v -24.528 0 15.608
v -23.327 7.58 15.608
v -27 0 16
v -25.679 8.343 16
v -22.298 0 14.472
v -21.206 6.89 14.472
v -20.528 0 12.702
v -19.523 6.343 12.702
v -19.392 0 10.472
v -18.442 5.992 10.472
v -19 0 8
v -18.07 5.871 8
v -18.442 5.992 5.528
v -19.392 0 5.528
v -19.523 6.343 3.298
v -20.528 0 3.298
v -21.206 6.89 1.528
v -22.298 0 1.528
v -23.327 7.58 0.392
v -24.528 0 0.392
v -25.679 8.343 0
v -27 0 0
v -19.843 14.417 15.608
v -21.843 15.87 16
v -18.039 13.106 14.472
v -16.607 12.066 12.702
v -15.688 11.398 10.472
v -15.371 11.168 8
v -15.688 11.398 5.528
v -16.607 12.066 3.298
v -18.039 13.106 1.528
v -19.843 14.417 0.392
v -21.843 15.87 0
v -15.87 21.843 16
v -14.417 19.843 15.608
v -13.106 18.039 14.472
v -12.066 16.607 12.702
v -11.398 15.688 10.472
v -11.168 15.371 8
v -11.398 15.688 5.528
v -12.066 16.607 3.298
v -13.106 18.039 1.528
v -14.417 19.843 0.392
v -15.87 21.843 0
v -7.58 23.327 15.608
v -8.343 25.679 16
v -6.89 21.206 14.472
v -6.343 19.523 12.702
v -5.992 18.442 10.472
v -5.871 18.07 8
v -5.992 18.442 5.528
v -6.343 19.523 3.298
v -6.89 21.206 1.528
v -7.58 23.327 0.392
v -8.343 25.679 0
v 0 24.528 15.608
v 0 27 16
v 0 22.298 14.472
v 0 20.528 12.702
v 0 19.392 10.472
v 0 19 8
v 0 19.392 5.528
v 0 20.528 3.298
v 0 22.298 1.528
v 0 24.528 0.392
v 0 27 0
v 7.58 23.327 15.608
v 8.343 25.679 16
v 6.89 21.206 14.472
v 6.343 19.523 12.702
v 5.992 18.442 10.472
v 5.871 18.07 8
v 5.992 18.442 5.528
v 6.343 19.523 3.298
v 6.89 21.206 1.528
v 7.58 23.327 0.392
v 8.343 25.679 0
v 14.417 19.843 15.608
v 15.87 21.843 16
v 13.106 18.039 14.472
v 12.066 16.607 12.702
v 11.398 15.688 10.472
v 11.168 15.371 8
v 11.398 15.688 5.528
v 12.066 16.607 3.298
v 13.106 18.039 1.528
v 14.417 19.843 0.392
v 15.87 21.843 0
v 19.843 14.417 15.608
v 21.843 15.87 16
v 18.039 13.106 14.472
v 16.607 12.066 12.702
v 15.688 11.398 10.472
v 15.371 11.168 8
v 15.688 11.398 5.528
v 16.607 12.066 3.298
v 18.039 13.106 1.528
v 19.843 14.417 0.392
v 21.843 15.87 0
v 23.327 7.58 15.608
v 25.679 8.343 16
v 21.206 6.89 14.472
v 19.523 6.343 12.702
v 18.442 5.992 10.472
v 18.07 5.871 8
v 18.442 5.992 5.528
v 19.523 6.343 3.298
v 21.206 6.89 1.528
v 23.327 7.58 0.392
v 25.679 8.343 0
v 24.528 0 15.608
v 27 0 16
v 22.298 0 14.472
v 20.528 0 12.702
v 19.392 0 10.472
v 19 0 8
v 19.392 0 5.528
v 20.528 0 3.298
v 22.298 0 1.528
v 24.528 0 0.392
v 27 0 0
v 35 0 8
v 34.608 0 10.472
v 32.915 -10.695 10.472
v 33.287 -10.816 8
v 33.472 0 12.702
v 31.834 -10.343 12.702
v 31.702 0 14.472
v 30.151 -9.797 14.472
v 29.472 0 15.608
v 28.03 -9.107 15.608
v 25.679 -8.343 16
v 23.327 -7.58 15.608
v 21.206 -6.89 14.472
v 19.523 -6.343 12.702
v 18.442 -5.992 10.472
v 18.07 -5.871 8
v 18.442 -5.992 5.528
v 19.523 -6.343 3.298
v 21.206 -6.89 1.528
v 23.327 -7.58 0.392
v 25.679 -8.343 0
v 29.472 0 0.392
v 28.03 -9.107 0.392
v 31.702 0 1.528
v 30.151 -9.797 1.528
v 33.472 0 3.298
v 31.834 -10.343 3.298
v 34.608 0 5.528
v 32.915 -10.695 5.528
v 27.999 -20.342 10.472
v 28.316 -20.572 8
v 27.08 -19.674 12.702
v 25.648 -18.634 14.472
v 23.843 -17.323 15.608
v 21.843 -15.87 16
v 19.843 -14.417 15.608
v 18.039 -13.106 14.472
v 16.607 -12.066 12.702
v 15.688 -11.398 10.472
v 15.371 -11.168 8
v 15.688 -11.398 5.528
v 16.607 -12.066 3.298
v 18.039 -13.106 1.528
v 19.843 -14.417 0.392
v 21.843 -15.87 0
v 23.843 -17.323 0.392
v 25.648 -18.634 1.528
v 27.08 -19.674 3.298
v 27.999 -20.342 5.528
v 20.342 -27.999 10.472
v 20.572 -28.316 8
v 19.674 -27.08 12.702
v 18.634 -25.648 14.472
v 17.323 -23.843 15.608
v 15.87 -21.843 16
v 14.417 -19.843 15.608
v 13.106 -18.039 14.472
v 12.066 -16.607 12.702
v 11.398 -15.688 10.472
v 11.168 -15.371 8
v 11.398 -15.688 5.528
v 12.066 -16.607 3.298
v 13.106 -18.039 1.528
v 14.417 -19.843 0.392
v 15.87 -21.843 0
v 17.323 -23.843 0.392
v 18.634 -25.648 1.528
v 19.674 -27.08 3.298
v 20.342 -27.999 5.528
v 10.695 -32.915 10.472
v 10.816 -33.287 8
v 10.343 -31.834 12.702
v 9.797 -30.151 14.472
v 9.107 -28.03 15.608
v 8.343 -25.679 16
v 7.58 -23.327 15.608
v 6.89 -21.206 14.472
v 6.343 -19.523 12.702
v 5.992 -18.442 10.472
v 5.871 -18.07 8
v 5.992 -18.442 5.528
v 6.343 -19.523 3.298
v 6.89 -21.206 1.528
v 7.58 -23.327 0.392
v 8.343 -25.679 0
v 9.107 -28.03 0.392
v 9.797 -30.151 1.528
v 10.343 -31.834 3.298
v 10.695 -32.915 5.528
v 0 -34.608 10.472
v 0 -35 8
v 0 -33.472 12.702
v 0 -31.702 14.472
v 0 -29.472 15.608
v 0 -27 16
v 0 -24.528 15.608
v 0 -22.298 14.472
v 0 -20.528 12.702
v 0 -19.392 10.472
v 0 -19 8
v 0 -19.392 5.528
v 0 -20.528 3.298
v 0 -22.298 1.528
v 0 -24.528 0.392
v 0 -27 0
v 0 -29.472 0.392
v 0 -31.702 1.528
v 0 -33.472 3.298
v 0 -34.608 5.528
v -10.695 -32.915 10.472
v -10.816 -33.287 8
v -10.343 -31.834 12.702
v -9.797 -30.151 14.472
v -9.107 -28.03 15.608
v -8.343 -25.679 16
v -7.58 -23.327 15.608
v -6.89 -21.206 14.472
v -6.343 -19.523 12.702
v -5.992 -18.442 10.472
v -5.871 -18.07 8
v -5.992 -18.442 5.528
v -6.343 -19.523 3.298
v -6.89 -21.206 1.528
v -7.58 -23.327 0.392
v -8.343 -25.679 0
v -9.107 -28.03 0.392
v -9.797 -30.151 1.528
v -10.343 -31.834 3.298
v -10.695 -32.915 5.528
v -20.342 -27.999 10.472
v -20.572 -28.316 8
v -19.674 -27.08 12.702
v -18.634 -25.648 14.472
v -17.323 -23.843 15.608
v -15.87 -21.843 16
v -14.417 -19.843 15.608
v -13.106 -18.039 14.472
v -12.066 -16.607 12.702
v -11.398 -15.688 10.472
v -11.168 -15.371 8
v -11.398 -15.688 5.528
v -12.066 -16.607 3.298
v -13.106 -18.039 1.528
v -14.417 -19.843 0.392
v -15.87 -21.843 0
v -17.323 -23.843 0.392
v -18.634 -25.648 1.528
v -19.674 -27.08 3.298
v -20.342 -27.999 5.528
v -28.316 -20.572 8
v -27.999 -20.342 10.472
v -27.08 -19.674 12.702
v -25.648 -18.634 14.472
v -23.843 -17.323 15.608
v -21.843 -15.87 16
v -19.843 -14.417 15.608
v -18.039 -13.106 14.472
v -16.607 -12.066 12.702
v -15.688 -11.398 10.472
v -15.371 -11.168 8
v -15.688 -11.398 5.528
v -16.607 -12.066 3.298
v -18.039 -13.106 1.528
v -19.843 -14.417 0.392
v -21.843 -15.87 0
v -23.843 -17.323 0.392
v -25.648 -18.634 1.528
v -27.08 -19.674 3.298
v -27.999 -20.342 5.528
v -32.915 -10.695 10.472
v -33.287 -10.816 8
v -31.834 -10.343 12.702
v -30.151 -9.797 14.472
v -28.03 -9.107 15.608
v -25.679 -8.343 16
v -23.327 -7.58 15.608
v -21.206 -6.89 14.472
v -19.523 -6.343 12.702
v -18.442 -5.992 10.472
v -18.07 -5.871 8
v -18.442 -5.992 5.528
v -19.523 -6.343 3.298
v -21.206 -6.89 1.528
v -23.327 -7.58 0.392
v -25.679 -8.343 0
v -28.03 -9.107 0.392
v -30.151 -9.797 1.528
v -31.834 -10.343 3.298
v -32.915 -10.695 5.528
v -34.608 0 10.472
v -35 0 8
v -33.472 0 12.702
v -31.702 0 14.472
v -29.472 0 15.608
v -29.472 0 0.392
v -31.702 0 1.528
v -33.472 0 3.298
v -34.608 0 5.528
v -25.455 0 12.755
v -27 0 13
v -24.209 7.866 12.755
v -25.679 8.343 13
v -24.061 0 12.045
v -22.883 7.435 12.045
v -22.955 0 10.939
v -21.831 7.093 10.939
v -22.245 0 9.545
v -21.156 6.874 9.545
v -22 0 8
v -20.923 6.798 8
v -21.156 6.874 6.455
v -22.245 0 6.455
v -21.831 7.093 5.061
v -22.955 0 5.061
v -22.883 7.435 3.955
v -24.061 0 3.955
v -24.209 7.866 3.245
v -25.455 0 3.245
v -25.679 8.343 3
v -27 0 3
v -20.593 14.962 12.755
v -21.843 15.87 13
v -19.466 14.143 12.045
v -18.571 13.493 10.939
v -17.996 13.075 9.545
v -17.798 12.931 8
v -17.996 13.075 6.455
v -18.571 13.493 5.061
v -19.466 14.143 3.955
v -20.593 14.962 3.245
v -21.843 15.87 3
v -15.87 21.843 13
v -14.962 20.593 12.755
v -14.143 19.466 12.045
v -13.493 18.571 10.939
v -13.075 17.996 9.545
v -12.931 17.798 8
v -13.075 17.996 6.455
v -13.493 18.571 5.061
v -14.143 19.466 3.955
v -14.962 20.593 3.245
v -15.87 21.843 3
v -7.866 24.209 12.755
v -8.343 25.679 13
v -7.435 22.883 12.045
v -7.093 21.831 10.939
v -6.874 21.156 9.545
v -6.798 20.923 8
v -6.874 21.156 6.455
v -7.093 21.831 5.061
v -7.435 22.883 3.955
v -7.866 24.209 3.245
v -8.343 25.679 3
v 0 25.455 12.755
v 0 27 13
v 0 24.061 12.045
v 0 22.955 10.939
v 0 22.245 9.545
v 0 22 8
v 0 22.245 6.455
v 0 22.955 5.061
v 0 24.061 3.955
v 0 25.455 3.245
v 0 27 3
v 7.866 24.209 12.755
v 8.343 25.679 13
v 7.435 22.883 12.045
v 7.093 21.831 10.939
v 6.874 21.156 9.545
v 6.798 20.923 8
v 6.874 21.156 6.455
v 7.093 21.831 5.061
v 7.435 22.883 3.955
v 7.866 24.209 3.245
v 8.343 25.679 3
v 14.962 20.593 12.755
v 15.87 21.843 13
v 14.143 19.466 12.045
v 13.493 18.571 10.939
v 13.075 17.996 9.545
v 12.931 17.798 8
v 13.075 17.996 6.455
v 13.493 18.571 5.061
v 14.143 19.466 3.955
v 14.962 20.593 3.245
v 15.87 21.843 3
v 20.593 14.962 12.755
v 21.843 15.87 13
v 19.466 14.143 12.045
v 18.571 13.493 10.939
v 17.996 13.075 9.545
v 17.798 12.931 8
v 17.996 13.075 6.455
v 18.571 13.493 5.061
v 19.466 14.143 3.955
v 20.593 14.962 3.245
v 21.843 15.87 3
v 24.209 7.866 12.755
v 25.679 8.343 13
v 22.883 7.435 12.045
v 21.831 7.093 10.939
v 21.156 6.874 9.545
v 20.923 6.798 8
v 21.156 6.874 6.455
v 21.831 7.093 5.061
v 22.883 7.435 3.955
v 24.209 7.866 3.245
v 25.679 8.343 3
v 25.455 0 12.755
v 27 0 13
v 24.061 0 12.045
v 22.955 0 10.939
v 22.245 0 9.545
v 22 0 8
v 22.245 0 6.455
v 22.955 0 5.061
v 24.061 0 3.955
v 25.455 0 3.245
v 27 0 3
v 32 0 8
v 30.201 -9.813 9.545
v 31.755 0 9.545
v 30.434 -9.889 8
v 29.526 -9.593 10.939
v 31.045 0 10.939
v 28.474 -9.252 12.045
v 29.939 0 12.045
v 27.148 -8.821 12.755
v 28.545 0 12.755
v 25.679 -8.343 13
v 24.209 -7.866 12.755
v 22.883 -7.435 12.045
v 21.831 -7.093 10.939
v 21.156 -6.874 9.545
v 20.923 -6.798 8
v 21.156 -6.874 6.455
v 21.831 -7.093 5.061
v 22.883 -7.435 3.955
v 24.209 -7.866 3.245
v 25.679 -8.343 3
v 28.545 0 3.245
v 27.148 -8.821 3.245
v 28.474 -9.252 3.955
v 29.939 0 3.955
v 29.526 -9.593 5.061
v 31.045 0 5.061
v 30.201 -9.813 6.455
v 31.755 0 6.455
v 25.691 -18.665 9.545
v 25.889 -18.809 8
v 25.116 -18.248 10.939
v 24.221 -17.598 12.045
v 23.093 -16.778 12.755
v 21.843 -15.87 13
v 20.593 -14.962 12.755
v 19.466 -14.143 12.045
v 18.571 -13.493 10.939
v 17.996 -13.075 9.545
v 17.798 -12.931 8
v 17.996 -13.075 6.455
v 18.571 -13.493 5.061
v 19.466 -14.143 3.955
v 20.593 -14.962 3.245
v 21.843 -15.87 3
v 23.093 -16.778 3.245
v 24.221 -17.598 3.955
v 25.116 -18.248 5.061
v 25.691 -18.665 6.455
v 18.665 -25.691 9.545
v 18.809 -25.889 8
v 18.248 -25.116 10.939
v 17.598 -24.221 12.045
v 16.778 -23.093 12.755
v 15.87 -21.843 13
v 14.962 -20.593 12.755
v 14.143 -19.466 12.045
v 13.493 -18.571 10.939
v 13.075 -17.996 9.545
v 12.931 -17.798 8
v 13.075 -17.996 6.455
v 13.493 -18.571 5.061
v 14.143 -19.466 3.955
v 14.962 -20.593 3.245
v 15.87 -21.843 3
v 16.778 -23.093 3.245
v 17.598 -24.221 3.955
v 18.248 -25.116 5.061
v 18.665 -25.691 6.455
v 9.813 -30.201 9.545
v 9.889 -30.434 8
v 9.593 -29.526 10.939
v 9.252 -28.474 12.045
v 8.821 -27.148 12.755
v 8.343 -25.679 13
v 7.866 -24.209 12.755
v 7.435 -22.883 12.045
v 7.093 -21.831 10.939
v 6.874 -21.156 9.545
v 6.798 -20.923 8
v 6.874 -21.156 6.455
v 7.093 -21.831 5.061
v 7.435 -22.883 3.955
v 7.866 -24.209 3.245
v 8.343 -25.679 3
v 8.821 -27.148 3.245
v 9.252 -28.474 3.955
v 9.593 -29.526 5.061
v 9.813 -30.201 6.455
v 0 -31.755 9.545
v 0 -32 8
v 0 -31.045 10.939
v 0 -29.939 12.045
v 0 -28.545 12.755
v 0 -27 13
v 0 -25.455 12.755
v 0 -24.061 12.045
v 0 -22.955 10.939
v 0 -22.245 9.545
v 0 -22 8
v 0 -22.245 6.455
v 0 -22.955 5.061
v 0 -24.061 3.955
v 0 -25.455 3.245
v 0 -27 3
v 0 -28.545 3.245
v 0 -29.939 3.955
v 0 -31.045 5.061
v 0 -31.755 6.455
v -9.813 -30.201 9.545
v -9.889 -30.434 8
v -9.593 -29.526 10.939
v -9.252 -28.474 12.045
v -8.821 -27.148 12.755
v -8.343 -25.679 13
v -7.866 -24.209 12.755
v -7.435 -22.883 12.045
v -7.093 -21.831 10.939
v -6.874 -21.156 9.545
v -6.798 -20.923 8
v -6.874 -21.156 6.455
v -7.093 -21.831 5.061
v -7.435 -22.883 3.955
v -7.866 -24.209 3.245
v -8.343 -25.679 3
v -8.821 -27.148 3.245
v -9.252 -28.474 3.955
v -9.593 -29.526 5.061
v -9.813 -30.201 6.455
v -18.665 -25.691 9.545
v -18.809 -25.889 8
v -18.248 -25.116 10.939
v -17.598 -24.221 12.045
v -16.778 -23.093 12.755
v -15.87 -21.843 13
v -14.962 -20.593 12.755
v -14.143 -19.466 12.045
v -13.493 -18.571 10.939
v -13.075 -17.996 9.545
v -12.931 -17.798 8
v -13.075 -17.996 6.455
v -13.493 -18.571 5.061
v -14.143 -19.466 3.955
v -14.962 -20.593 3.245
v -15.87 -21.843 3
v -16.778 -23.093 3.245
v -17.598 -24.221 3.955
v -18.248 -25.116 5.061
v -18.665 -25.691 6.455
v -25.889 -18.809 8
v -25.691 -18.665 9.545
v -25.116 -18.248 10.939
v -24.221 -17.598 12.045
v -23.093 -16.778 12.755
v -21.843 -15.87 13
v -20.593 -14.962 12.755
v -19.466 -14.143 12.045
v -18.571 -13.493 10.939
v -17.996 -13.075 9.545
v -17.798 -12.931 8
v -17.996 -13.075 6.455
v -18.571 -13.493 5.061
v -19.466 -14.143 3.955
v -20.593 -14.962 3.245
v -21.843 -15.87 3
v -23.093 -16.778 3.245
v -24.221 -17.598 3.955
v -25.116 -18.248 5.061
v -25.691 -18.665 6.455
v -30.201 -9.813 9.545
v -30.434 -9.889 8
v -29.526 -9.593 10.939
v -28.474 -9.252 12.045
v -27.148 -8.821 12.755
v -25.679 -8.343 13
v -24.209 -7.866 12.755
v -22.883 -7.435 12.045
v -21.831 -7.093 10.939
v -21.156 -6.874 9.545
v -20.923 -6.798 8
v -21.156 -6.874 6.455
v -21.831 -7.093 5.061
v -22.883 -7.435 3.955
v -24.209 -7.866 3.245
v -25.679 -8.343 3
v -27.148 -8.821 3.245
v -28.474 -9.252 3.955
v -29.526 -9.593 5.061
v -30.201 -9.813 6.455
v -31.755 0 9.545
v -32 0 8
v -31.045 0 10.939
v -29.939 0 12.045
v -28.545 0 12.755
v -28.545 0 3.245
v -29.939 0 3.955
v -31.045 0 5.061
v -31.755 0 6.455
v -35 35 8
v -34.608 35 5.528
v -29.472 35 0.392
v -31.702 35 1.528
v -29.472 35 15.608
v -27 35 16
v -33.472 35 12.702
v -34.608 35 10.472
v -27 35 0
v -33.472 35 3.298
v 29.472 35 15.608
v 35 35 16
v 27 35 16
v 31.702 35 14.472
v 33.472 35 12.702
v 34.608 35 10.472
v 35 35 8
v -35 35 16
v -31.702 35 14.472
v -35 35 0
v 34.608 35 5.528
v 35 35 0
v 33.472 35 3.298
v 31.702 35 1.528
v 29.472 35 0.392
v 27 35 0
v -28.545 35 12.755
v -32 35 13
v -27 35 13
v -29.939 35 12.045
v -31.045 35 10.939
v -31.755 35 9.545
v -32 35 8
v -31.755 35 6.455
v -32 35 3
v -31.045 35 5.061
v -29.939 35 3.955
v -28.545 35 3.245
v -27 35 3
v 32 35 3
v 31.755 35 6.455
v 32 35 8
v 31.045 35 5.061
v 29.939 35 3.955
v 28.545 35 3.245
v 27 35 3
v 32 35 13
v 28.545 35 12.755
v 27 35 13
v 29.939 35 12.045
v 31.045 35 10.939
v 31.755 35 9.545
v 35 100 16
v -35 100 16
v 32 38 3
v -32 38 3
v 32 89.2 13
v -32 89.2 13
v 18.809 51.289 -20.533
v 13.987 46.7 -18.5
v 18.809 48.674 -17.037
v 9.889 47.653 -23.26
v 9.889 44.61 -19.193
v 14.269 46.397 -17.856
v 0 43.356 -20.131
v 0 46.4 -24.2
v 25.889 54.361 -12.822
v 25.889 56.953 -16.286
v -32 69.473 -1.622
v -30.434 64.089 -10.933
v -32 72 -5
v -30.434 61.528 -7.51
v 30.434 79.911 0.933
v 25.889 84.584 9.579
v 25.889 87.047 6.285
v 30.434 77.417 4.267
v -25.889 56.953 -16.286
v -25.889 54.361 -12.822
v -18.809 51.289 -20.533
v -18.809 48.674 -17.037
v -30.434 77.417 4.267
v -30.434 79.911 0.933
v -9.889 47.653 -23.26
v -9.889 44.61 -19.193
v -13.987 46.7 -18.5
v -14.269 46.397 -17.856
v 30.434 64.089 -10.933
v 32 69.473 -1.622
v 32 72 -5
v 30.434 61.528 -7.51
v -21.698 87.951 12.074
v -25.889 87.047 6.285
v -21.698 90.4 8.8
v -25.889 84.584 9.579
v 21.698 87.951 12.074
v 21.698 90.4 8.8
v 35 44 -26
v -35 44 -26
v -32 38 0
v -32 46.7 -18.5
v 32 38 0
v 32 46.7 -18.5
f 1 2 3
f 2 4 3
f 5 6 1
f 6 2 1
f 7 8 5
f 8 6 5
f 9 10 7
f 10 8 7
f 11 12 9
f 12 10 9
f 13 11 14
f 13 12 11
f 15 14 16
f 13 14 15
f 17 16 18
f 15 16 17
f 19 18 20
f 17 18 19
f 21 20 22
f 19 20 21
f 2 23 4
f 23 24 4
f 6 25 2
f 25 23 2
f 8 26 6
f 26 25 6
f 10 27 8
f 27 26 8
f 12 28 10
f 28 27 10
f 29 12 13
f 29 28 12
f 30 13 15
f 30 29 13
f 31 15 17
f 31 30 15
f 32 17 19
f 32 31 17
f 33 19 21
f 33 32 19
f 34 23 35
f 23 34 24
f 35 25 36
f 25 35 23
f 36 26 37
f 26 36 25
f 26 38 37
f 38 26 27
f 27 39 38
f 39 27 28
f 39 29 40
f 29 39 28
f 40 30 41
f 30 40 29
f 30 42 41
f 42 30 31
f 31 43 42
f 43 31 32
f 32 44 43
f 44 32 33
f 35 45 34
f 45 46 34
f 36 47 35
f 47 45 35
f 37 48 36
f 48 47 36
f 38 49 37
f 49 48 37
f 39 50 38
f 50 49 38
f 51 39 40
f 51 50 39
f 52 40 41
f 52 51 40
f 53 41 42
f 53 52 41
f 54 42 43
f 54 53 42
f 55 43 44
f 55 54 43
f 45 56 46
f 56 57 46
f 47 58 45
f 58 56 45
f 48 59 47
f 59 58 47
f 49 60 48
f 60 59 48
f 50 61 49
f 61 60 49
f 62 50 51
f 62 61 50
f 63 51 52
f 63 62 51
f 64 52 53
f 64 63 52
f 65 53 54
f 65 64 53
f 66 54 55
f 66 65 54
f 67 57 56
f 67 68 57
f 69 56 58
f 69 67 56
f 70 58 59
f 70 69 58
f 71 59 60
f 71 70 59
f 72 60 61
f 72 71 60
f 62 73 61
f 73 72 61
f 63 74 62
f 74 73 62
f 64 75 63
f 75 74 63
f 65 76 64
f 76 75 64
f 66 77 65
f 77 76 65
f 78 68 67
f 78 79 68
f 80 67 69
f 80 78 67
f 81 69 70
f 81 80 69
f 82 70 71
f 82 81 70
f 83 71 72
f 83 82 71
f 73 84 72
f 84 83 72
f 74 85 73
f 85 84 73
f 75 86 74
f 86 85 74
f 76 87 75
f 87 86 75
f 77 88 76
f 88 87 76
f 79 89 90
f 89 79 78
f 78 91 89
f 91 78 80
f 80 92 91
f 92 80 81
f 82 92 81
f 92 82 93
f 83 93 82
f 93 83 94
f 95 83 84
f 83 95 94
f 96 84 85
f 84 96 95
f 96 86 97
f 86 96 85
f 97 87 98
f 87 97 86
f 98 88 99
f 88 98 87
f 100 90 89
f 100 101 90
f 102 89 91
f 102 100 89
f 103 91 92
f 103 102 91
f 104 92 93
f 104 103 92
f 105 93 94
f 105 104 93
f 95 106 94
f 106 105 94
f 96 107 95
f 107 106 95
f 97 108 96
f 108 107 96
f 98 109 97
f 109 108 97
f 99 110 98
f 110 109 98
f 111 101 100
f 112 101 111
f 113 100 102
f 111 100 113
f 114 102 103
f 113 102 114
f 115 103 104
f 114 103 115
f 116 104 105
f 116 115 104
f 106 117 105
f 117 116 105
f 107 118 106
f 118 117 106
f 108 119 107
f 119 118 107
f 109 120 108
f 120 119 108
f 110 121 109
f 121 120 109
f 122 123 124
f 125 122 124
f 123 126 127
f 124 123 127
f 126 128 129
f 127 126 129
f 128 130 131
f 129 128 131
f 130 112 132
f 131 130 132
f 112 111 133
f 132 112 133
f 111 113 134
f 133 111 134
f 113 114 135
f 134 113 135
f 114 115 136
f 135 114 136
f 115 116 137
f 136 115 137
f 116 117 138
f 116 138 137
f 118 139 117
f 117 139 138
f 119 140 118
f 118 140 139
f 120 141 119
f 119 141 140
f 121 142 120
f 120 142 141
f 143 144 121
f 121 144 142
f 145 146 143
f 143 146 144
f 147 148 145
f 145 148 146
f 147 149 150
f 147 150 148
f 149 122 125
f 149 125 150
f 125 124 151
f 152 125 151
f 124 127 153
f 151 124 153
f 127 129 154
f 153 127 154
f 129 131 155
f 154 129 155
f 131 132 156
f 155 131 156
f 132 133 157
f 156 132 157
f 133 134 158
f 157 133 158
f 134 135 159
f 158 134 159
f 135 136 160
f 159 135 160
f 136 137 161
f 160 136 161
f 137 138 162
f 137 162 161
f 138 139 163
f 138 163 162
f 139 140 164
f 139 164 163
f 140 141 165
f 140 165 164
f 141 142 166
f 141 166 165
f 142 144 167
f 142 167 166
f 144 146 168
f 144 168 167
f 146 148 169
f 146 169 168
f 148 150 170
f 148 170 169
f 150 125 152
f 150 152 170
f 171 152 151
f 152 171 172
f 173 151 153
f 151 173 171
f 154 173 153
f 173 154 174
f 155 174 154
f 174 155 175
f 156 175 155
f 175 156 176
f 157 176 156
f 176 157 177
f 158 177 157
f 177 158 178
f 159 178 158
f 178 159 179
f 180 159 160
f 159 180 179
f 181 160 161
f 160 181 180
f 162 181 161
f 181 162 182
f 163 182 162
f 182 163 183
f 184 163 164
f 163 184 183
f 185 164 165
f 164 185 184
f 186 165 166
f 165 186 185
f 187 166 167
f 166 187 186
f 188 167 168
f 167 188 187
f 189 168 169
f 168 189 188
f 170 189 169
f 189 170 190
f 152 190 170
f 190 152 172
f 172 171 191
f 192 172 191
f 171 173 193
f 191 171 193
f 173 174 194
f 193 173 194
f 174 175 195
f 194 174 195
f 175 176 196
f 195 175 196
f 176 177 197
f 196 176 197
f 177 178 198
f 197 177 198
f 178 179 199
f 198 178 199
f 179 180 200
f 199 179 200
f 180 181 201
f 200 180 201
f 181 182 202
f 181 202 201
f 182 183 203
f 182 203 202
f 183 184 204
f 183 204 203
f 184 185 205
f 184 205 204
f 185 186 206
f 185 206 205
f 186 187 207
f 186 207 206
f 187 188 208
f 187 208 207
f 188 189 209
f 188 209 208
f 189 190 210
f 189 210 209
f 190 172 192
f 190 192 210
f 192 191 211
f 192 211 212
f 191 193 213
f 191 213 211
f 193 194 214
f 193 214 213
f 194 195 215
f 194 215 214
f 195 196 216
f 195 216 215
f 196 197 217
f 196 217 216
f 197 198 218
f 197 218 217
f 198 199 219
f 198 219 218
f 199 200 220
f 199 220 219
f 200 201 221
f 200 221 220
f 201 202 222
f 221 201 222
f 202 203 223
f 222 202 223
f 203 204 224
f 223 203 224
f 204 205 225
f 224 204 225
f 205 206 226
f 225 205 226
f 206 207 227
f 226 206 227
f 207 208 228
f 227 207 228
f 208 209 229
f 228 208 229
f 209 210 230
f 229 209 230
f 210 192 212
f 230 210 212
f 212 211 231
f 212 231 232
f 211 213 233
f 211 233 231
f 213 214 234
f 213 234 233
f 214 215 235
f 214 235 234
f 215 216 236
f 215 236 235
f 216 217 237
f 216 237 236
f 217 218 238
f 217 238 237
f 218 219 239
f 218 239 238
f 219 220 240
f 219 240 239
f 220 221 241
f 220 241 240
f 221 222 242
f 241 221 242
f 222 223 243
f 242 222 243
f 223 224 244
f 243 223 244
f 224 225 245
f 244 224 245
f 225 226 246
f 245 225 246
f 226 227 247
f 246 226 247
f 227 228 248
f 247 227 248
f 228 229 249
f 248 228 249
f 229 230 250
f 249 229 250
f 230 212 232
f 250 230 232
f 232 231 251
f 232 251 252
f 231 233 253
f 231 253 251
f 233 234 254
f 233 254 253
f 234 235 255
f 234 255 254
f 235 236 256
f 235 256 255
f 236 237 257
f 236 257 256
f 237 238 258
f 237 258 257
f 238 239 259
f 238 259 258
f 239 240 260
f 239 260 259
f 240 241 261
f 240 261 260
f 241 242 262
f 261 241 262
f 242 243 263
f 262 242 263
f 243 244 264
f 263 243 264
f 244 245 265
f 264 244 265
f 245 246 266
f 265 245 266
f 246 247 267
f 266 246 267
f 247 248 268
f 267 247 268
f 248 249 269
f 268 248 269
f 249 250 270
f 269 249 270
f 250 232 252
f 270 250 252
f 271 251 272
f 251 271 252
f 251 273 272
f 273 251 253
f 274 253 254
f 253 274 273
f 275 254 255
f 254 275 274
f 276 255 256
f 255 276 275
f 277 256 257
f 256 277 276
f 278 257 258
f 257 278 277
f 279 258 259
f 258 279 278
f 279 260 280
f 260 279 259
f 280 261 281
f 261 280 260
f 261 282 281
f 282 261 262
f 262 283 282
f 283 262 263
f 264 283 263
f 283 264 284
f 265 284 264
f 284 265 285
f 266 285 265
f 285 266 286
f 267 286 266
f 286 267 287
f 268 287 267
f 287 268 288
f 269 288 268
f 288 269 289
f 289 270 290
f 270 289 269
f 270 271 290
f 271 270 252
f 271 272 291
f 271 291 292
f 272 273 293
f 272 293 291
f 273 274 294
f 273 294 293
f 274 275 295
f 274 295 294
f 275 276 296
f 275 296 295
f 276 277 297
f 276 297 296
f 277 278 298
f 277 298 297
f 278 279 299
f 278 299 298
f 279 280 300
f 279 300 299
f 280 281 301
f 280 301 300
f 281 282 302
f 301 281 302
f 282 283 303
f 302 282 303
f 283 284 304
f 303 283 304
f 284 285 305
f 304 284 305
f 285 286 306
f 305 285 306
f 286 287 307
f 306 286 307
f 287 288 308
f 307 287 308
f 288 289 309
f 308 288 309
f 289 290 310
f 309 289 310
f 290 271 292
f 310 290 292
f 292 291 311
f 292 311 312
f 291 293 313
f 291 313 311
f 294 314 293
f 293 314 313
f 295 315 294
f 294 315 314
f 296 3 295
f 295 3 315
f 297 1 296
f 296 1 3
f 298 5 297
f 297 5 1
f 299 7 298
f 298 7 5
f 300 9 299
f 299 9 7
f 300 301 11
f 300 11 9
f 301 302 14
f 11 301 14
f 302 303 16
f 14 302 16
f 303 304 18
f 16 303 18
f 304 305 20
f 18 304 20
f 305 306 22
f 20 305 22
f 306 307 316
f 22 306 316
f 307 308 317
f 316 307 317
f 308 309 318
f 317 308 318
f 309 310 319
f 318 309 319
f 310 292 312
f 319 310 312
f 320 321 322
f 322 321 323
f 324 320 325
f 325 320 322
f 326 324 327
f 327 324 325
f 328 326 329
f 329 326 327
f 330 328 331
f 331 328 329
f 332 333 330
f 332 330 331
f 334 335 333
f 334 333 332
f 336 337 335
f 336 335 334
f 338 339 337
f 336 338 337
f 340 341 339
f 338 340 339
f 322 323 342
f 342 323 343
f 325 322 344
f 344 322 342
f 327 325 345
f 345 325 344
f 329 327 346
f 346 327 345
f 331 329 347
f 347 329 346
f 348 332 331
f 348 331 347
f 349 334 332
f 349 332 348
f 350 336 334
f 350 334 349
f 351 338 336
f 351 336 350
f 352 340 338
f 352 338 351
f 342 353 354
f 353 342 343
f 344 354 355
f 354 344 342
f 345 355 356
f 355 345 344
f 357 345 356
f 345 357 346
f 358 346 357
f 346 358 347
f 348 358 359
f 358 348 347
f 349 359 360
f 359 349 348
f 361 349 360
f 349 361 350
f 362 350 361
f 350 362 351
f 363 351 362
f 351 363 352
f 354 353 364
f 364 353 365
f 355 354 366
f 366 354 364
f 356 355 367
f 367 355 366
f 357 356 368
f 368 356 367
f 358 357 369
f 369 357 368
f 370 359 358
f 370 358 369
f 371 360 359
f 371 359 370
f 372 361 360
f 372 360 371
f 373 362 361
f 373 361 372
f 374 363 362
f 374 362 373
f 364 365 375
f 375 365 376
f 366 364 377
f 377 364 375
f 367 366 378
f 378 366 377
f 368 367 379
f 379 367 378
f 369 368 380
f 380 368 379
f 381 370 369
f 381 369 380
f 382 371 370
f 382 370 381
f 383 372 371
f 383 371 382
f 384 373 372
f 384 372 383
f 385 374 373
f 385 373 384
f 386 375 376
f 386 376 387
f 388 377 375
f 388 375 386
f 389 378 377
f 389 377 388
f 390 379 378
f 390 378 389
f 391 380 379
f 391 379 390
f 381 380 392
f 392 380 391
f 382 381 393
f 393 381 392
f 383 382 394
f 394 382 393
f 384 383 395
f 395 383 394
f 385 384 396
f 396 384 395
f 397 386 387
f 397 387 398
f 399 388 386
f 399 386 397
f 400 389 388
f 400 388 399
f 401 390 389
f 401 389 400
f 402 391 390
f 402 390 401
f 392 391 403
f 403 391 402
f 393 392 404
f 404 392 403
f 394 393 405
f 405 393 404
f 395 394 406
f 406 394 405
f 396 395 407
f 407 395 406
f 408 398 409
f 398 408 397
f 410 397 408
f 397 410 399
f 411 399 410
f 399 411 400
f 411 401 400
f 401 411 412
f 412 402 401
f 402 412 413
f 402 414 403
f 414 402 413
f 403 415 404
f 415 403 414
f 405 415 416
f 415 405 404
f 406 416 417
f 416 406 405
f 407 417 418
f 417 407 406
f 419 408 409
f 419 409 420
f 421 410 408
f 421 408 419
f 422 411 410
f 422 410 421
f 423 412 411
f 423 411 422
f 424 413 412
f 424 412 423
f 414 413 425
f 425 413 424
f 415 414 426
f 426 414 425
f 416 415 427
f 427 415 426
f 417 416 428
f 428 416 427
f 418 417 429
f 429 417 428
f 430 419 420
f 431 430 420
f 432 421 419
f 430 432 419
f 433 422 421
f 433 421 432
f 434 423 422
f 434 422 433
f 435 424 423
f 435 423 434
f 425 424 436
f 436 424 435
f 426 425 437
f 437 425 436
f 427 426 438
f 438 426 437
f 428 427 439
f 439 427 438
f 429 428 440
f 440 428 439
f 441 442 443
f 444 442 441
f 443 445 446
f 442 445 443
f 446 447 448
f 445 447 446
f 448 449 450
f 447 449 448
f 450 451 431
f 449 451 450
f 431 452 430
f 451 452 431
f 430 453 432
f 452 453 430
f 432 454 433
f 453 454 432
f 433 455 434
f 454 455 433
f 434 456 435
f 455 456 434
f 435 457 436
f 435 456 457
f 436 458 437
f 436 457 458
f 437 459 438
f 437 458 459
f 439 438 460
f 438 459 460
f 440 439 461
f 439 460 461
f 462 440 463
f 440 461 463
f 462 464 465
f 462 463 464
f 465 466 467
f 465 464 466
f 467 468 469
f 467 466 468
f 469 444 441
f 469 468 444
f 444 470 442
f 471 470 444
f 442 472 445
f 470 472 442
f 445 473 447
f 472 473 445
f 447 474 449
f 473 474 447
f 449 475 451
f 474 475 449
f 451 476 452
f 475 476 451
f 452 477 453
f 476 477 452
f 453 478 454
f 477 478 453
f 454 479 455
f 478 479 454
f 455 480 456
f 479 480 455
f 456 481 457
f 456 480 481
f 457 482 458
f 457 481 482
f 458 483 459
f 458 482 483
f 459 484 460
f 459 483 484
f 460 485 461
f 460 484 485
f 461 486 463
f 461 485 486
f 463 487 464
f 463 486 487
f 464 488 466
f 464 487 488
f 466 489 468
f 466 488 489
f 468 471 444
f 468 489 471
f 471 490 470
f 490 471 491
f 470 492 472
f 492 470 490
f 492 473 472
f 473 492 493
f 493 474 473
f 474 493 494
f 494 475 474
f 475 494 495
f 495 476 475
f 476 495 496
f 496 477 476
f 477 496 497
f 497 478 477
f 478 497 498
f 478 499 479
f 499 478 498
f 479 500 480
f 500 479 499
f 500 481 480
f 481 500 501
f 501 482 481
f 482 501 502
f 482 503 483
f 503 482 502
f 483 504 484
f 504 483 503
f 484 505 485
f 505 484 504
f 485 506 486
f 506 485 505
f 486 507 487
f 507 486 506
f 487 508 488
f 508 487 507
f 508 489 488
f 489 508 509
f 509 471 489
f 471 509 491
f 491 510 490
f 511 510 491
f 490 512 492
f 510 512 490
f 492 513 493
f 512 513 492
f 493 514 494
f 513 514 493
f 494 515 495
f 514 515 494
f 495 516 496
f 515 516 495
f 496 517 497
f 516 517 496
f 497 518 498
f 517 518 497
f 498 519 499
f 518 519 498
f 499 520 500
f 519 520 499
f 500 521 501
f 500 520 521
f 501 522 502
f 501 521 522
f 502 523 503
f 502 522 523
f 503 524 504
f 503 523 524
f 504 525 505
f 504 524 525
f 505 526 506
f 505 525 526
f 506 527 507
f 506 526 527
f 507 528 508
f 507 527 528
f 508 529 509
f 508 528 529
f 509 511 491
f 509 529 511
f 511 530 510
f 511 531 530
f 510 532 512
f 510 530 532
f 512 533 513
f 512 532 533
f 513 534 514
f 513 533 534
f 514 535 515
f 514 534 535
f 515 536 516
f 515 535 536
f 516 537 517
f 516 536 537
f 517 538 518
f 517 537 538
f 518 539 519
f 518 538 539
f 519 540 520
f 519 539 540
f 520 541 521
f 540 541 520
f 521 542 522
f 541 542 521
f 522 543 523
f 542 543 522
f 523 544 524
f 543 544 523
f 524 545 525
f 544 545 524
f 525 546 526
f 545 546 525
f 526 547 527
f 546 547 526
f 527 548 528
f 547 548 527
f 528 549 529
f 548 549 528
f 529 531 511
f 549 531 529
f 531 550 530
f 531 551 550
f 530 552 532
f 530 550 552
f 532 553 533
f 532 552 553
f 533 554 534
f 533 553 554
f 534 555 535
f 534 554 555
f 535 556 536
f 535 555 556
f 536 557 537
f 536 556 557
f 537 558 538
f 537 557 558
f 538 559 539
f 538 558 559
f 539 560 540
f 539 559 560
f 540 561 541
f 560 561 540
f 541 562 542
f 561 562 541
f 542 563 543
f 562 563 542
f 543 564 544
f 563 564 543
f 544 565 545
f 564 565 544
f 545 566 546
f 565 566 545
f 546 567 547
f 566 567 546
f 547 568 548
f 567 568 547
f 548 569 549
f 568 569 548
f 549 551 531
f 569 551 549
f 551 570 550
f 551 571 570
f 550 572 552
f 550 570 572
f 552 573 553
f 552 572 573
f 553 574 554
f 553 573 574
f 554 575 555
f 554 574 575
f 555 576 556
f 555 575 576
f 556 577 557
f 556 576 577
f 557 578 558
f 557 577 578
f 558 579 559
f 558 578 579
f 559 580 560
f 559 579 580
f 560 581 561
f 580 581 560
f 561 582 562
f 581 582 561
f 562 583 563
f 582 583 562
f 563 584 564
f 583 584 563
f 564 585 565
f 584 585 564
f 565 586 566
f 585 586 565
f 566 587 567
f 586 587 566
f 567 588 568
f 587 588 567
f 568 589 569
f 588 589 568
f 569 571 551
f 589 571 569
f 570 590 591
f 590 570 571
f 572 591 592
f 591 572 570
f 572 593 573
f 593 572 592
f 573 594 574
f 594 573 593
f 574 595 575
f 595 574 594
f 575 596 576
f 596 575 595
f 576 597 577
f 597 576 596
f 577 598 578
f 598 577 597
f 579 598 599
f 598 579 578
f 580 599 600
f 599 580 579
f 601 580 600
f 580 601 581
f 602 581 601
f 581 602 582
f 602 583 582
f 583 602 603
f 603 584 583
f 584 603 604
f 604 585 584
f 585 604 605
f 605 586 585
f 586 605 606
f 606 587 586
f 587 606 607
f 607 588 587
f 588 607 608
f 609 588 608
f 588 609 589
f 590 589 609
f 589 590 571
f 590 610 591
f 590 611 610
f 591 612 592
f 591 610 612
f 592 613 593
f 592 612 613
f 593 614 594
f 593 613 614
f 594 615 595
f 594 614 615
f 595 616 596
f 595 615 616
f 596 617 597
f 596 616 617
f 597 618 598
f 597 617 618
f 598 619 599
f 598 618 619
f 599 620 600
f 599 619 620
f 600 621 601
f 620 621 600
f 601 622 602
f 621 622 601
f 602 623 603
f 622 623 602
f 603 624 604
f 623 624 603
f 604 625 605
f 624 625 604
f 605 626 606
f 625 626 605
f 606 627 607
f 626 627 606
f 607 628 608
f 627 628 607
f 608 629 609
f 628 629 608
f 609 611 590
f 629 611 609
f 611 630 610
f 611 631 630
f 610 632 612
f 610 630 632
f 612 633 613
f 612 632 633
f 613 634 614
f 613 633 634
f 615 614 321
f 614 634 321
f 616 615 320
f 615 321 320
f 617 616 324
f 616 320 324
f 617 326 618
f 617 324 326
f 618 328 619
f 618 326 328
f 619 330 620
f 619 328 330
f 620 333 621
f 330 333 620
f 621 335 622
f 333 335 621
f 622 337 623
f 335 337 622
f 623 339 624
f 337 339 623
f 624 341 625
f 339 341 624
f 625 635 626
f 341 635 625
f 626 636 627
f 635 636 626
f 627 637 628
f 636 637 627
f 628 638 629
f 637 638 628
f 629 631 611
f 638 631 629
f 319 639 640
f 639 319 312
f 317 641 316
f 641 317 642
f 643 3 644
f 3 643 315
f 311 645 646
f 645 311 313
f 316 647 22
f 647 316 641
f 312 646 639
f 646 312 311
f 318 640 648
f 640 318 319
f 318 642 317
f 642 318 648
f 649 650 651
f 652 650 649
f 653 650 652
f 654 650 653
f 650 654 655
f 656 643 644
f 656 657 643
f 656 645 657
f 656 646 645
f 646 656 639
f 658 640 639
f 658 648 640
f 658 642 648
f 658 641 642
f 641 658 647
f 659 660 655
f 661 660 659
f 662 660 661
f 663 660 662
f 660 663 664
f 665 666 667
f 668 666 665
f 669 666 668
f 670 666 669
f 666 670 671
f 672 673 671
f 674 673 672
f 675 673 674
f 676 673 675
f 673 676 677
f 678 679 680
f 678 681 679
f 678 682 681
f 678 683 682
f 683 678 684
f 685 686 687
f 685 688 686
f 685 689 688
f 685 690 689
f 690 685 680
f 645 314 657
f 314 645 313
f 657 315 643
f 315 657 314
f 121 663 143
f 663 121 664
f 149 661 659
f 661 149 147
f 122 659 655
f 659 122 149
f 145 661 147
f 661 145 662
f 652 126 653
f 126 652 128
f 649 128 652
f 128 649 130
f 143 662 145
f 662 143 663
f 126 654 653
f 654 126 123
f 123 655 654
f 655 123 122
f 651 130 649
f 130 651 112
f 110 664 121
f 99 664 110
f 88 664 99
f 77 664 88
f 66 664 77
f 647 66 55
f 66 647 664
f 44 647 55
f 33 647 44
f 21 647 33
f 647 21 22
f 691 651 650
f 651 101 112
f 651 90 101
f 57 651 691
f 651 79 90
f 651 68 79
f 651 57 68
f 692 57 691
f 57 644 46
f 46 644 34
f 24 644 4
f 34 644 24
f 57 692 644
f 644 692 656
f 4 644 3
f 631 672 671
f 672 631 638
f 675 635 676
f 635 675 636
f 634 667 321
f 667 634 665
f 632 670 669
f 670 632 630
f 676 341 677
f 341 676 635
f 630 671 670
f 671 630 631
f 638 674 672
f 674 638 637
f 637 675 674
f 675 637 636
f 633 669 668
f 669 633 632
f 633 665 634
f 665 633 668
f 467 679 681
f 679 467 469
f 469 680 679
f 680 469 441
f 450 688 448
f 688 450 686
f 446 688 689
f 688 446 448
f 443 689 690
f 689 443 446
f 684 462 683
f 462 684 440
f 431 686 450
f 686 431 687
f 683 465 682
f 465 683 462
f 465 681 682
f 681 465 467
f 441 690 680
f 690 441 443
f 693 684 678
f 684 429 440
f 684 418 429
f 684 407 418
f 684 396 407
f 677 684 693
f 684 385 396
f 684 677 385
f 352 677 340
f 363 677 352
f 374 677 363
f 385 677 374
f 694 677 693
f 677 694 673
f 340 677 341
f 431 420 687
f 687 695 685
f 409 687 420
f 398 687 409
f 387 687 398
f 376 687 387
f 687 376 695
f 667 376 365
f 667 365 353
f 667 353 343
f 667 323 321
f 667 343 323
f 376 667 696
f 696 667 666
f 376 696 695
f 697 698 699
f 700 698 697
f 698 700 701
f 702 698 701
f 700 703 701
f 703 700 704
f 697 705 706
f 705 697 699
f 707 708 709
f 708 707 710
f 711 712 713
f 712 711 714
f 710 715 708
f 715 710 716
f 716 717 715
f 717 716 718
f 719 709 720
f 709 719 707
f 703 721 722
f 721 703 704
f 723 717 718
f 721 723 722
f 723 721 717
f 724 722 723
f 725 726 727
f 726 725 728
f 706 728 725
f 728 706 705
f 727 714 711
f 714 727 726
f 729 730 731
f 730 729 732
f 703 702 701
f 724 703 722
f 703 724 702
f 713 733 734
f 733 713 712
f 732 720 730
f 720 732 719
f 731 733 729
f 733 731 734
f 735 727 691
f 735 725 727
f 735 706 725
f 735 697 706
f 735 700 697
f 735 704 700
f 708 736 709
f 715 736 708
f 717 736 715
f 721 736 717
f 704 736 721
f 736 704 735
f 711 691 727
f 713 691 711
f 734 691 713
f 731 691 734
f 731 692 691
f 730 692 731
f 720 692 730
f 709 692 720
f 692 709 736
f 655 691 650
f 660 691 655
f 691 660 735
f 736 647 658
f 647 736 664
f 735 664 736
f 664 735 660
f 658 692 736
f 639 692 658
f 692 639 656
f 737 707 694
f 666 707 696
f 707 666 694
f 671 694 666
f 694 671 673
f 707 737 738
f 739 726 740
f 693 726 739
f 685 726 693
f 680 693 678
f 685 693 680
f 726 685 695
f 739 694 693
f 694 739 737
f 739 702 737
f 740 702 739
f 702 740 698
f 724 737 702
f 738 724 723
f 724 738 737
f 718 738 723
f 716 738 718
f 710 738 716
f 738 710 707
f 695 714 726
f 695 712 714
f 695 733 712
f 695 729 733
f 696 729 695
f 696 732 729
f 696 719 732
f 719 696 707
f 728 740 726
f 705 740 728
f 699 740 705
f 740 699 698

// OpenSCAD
$fn=20;

width=70;
length=100+width/2;
height=42;

wall = 3;

ro=8;
ri=ro-wall;

a1=acos(height/width);

union() {
difference() {

	// ring
	translate([0,0,ro]) difference() {
	rotate_extrude(convexity = 10)translate([(width/2)-ro, 0, 0])circle(r = ro);
	rotate_extrude(convexity = 10)translate([(width/2)-ro, 0, 0])circle(r= ri);
	}

	// ring opening for air input
	difference() {
	translate([-width, 0, -ro]) cube([2*width,2*width,4*ro]);
	translate([0,0,-ro]) cylinder(r=(width/2)-ro, h=3*ro);
	}

}

// channel
difference() {
	translate([-(width/2-ro),0,ro])rotate([-90,0,0]) difference() {
		// outer channel
		union() {
			cylinder(r=ro, h=width/2);
			translate([(width-2*ro),0,0]) cylinder(r=ro, h=width/2);
			translate([0,-ro,0]) cube([(width-2*ro),2*ro,width/2]);
		}
		// inner channel
		translate([0,0,-width/4]) union() {
			cylinder(r=ri, h=width);
			translate([(width-2*ro),0,0]) cylinder(r=ri, h=width);
			translate([0,-ri,0]) cube([(width-2*ro),2*ri,width]);
		}
	}
	translate([0,0,-ro]) cylinder(r=(width/2)-ro, h=4*ro);
}

// back part
translate([-width/2,length-width/2,2*ro])
rotate([90,180,90])
difference() {
	linear_extrude(height=width)
		polygon([[0,0],[length-width,0],[length-width,2*ro],[56,height]]);
	translate([0,0,wall])
		linear_extrude(height=width-2*wall)
		polygon([[3.6*wall,wall],[length-width,wall],[length-width,2*ro-wall],[length-width-wall,2*ro-wall],[length-width-wall,2*ro],[56-0.9*wall,height-2.5*wall]]);
	
	rotate([90,0,36.8])
		translate([(width/2),(width/2),-1])
		difference() {
			cylinder(r=(width/2)-wall, h=wall+3);
			translate([-width/2,-width/2,0])cube([12,width,wall+5]);
		}
}
}
